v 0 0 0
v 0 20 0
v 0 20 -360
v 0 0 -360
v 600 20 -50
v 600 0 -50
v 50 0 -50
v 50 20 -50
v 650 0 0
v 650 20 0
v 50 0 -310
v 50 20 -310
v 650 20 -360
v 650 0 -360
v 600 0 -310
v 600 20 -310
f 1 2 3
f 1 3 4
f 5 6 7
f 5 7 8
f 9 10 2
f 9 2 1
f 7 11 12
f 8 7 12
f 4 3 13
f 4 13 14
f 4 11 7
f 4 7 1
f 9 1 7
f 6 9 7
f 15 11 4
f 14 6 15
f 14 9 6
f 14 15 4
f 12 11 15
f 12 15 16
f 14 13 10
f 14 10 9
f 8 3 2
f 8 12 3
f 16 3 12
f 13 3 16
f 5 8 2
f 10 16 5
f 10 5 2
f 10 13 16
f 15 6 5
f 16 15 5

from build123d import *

# Parameters (mm, degrees)
SKETCH1_W = 50
SKETCH1_H = 20


with BuildPart() as part:
    # Sweep1: sweep along a curve in space
    with BuildLine() as sweep1_path:
        Line((0, 0, 0), (650, 0, 0))
        Line((650, 0, 0), (650, 0, -360))
        Line((650, 0, -360), (0, 0, -360))
        Line((0, 0, -360), (0, 0, 0))
    # Sketch1 → Sweep1 (sweep)
    with BuildSketch(Plane(origin=(0, 0, 0), x_dir=(0, 0, -1), z_dir=(1, 0, 0))):
        with Locations((25, 10)):
            Rectangle(SKETCH1_W, SKETCH1_H)
    sweep(path=sweep1_path.line, transition=Transition.RIGHT)


solid = part.part
